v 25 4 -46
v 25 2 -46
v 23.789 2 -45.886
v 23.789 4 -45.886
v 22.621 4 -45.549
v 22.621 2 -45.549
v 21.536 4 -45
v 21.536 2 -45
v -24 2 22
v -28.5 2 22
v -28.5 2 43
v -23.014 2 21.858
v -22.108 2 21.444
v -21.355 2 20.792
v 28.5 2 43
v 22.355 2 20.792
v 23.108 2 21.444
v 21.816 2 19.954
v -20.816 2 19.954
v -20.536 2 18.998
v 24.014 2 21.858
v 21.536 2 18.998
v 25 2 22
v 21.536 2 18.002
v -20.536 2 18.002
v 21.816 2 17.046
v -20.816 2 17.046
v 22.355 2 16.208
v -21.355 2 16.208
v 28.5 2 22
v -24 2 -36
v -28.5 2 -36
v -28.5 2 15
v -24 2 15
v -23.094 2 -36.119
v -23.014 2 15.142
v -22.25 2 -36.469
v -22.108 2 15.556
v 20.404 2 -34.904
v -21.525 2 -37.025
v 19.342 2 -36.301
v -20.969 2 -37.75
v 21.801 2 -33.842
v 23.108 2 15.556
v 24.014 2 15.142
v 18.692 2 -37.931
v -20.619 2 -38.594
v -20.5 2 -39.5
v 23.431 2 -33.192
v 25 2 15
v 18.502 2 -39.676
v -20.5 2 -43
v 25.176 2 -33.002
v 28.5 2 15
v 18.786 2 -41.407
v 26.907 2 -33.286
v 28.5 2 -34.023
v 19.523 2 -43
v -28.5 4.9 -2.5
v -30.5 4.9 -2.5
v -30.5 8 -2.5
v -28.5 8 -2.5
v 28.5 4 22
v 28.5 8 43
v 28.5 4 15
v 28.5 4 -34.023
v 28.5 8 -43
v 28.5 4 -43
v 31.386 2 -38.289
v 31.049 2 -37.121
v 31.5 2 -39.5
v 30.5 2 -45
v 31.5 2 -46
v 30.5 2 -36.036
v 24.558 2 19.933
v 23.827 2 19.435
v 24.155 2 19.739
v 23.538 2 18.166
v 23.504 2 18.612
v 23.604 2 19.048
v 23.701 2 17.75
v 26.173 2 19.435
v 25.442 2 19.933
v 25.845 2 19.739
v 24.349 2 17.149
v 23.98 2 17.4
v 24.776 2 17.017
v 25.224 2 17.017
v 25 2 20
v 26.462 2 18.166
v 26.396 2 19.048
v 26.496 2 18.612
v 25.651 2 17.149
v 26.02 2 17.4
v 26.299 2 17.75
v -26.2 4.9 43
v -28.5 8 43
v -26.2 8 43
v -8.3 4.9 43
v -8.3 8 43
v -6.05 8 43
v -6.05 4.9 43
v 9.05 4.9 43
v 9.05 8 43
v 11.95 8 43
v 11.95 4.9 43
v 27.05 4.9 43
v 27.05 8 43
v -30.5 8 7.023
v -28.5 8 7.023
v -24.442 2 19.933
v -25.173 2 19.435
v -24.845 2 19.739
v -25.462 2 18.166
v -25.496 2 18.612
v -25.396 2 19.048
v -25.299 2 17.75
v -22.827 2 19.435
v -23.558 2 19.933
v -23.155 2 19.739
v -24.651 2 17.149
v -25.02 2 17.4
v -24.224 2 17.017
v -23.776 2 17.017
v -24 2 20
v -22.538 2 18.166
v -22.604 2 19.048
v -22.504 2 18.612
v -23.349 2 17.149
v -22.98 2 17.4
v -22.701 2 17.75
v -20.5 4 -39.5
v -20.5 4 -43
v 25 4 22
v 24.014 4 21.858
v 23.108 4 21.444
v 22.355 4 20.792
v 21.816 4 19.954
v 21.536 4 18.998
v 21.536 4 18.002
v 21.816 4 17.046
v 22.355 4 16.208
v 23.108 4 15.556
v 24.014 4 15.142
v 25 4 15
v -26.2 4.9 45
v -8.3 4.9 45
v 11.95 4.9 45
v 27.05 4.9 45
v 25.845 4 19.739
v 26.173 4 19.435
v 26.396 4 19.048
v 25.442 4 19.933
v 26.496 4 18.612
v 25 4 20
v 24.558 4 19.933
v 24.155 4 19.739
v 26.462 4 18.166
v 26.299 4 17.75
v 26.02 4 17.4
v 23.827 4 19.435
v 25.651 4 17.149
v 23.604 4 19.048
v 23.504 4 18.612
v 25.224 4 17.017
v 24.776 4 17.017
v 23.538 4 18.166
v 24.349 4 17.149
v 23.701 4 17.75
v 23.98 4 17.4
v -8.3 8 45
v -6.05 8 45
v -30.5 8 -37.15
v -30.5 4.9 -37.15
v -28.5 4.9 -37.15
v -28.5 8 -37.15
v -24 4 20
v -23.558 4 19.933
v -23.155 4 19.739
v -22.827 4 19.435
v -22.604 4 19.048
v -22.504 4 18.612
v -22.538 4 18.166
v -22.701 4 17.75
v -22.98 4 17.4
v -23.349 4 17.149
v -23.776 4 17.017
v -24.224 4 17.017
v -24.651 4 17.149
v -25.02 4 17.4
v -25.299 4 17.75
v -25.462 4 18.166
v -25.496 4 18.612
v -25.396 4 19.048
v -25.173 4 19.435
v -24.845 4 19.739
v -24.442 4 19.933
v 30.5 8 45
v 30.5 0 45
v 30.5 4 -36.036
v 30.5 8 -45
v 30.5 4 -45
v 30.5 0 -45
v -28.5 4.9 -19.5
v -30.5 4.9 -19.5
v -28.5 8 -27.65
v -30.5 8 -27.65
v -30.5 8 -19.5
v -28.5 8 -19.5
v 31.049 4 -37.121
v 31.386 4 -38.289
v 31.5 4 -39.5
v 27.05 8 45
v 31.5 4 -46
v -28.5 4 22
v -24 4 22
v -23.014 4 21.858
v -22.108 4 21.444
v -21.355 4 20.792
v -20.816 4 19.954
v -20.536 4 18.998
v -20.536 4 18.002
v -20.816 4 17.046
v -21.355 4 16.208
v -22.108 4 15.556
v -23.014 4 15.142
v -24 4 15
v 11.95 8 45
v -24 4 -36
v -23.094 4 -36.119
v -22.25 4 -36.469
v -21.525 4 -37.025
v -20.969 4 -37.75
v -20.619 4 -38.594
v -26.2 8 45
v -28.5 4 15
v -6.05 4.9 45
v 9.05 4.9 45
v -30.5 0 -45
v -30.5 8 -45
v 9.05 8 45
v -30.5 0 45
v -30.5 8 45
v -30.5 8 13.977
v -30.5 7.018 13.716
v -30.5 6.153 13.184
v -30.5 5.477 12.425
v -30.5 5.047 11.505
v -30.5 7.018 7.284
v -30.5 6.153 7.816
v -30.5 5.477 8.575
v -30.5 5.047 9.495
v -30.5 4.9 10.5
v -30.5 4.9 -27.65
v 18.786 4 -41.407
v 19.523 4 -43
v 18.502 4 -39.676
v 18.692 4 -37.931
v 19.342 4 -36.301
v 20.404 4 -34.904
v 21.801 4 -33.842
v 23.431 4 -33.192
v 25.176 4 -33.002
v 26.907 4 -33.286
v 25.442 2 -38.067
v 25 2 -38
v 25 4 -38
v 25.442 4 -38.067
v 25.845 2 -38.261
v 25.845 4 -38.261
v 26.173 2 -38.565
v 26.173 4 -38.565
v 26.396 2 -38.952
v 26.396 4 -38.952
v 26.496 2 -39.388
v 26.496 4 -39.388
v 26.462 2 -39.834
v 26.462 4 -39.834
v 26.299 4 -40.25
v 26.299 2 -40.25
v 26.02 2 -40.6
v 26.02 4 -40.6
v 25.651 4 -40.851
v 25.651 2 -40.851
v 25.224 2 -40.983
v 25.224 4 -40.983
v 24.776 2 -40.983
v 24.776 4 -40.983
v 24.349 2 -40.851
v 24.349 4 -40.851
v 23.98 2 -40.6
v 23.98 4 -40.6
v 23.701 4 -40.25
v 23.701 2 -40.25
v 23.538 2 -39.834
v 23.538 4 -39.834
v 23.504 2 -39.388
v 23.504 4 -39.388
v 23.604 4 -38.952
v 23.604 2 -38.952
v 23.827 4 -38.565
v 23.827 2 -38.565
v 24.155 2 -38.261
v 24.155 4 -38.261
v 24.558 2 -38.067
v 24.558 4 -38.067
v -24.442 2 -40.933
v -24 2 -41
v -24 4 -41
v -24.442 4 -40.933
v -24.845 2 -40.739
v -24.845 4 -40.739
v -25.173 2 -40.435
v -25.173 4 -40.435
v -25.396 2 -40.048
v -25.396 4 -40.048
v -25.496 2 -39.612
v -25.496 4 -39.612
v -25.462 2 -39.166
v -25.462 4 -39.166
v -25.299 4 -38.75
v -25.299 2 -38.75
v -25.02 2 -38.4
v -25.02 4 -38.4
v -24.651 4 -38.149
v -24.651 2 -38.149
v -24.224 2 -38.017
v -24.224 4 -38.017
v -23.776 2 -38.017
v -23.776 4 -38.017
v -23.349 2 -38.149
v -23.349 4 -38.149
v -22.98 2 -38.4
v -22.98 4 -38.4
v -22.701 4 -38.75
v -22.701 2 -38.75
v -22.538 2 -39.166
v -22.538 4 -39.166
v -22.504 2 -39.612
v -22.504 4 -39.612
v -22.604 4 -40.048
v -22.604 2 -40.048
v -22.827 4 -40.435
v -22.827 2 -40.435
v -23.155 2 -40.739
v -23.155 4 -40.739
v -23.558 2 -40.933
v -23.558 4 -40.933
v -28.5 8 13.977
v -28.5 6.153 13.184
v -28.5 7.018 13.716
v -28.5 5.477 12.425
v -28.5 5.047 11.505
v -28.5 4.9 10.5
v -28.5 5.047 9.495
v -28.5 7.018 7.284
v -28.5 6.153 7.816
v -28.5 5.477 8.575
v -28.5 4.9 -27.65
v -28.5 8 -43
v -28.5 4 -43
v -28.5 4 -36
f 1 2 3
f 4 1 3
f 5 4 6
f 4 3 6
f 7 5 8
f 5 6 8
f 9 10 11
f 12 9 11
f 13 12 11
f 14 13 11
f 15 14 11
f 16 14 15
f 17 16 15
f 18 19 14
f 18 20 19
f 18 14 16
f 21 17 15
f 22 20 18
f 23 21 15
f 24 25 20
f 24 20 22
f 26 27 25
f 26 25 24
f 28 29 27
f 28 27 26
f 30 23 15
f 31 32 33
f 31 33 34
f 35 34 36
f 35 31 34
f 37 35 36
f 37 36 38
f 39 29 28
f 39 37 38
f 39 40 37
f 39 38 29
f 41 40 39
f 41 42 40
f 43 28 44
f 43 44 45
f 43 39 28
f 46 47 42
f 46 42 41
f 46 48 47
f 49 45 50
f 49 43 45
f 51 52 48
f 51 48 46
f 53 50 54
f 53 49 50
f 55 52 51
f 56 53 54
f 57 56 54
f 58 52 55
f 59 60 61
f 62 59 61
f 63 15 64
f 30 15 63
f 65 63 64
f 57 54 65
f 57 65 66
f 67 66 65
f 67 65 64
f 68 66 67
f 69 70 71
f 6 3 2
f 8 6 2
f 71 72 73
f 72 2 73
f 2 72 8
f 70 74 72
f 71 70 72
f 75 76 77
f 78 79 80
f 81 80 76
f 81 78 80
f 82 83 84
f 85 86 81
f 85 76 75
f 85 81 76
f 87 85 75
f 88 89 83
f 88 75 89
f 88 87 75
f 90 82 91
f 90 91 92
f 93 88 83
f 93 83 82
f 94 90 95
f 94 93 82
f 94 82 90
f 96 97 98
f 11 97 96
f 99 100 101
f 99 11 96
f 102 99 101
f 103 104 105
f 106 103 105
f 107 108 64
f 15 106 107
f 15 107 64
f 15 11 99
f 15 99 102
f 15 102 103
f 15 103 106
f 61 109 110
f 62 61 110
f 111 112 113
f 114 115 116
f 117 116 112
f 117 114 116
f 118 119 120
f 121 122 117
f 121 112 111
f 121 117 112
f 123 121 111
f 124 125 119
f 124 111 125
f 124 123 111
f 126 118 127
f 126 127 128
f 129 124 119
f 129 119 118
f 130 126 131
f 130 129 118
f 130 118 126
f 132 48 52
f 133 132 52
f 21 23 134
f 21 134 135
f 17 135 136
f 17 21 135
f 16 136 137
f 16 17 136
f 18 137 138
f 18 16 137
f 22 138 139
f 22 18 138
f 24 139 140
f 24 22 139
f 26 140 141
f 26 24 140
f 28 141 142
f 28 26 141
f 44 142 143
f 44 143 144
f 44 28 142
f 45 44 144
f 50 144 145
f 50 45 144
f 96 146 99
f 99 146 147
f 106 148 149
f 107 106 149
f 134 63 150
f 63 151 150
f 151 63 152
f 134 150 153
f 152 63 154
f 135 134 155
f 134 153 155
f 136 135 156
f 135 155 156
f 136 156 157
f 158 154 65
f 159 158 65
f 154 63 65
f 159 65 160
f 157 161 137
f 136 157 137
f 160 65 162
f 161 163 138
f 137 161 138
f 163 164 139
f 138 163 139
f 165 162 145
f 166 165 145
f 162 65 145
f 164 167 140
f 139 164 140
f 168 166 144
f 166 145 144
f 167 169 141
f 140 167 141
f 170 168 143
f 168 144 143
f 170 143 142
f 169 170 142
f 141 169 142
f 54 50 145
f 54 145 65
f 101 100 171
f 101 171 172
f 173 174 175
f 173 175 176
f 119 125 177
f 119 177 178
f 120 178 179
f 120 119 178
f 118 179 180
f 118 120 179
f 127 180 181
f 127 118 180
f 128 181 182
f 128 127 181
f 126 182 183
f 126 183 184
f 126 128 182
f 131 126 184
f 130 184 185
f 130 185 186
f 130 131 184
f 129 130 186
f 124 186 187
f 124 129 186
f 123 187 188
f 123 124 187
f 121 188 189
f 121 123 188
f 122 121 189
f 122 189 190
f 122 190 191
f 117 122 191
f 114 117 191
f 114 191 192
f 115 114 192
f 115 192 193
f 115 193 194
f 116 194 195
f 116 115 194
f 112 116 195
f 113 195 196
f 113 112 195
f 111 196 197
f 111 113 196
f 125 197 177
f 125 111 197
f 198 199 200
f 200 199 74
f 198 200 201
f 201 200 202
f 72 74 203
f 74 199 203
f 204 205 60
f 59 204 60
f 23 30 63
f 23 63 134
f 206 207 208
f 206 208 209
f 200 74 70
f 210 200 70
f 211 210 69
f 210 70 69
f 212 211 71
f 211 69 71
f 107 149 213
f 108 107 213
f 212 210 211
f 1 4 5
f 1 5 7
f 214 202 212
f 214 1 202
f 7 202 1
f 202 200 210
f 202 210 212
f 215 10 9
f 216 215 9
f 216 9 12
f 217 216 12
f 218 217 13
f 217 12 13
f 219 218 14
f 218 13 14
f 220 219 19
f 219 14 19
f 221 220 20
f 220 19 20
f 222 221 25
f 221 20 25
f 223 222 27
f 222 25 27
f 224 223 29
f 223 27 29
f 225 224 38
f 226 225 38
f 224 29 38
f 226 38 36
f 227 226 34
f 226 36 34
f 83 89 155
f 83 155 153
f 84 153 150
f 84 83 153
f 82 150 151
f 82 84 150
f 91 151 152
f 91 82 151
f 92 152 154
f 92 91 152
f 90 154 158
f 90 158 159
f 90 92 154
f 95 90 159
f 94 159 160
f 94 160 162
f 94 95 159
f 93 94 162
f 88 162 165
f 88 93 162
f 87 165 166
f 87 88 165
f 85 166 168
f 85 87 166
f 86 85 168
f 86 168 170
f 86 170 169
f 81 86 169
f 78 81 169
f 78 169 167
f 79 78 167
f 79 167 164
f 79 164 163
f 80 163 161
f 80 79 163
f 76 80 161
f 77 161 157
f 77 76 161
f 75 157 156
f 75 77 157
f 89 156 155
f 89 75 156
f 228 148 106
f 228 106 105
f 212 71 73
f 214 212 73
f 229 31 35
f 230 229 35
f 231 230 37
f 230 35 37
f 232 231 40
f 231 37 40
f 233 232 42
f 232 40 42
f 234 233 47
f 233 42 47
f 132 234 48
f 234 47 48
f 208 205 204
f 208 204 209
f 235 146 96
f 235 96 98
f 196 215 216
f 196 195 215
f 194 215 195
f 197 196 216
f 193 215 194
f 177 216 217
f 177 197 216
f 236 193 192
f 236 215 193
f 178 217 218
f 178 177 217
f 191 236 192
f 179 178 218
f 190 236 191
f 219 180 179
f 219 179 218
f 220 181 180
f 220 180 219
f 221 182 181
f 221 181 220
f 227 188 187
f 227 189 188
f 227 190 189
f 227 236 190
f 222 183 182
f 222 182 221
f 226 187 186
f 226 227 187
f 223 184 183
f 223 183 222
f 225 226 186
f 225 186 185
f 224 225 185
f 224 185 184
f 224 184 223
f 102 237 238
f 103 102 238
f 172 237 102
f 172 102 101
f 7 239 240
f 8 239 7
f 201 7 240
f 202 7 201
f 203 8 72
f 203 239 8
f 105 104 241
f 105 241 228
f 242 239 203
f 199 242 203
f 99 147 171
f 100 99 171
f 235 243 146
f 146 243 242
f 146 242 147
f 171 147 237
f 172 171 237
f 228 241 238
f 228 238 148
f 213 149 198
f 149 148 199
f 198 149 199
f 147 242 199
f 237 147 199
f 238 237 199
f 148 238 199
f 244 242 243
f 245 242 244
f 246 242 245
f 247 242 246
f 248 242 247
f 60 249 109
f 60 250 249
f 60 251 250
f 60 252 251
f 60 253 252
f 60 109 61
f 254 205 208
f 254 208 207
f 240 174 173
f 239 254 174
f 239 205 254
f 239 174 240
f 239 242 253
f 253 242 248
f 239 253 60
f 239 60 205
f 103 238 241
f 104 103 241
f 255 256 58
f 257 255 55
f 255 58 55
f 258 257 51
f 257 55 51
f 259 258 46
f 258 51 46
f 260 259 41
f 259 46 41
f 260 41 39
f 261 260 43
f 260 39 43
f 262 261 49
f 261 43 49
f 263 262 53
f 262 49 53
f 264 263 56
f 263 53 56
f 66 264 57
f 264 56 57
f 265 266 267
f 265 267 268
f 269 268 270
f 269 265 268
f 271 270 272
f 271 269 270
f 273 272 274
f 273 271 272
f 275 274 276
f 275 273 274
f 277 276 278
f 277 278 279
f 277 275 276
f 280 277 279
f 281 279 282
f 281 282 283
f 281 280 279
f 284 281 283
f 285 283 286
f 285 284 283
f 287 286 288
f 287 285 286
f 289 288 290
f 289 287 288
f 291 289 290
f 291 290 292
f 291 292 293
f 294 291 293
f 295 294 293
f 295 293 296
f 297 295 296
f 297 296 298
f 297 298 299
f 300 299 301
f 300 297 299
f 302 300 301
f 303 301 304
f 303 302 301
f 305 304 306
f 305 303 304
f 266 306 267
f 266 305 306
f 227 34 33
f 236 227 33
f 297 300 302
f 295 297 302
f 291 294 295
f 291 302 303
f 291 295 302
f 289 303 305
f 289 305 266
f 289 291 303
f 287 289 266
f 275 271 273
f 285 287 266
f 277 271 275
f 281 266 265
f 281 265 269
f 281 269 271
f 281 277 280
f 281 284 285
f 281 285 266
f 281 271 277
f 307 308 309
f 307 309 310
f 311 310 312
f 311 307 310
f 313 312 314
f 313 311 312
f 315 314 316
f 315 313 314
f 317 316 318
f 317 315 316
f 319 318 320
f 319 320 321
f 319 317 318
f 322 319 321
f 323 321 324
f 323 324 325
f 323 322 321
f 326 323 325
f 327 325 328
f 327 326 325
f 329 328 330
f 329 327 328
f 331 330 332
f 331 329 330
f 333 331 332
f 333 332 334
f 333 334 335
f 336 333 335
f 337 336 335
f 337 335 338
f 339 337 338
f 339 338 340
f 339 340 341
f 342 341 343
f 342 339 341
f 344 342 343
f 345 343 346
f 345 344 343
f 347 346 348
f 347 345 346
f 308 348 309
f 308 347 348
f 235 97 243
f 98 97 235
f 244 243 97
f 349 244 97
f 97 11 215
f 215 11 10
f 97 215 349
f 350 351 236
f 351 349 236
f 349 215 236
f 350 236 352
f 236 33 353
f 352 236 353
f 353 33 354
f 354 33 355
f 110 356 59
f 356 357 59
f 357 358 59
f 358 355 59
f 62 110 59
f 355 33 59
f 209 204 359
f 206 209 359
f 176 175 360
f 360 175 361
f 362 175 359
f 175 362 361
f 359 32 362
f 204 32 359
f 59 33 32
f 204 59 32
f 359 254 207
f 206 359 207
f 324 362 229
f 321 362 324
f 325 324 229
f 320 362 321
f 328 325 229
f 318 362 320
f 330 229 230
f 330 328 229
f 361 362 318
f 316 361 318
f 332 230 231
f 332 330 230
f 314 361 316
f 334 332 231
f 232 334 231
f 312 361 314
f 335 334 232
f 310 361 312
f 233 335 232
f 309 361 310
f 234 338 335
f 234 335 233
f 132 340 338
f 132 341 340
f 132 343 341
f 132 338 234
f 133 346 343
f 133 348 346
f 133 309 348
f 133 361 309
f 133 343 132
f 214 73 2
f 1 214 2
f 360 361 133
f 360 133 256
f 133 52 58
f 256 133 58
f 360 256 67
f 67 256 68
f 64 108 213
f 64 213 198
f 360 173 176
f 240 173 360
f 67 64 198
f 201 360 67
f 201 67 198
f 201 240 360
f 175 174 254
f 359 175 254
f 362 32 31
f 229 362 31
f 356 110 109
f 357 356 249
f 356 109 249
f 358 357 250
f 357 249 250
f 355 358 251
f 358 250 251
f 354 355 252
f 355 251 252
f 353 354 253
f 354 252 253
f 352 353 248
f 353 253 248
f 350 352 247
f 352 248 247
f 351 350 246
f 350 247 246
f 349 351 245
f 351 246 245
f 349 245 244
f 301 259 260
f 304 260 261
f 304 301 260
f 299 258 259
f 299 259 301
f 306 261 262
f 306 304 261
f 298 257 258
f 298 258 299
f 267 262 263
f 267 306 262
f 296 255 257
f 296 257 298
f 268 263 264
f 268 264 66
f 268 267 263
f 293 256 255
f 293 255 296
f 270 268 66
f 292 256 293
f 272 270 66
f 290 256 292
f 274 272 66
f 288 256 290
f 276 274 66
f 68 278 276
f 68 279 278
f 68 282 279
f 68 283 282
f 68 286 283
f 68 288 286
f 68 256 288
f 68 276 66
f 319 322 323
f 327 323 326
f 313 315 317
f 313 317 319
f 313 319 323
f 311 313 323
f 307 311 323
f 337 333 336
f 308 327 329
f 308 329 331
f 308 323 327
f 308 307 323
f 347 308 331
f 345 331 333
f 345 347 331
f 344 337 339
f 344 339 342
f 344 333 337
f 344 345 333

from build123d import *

# Parameters (mm, degrees)
SKETCH1_W            = 61
SKETCH1_H            = 90
BOSS_EXTRUDE1_DEPTH  = 8
SKETCH4_W            = 57
SKETCH4_H            = 86
CUT_EXTRUDE1_DEPTH   = 6
SKETCH5_R            = 1.5
BOSS_EXTRUDE12_DEPTH = 2
CUT_EXTRUDE2_REACH   = 79.614
SKETCH6_R            = 3.5
SKETCH6_W            = 17
SKETCH6_H            = 6.5
SKETCH6_W_2          = 9.5
SKETCH6_H_2          = 4
CUT_EXTRUDE3_REACH   = 98.629
SKETCH8_W            = 17.9
SKETCH8_H            = 15.5
SKETCH8_W_2          = 15.1
SKETCH8_H_2          = 16


with BuildPart() as part:
    # Sketch1 → Boss-Extrude1 (new body)
    with BuildSketch(Plane(origin=(0, 0, 0), x_dir=(1, 0, 0), z_dir=(0, 1, 0))):
        Rectangle(SKETCH1_W, SKETCH1_H)
    extrude(amount=BOSS_EXTRUDE1_DEPTH)

    # Sketch4 → Cut-Extrude1 (cut)
    with BuildSketch(Plane(origin=(0, 2, 0), x_dir=(1, 0, 0), z_dir=(0, 1, 0))):
        Rectangle(SKETCH4_W, SKETCH4_H)
    extrude(amount=CUT_EXTRUDE1_DEPTH, mode=Mode.SUBTRACT)

    # Sketch5 → Boss-Extrude12 (add)
    # profile 1 of 4: a face of its own
    with BuildSketch(Plane(origin=(0, 2, 0), x_dir=(1, 0, 0), z_dir=(0, 1, 0))):
        with BuildLine():
            Line((25, -15), (28.5, -15))
            Line((28.5, -15), (28.5, -22))
            Line((28.5, -22), (25, -22))
            ThreePointArc((25, -22), (21.5, -18.5), (25, -15))
        make_face()
        with Locations(Location((25, -18.5, 0), (0, 0, 270))):
            Circle(SKETCH5_R, mode=Mode.SUBTRACT)
    # profile 2 of 4: a face of its own
    with BuildSketch(Plane(origin=(0, 2, 0), x_dir=(1, 0, 0), z_dir=(0, 1, 0))):
        with BuildLine():
            Line((31.5, 39.5), (31.5, 46))
            Line((31.5, 46), (25, 46))
            ThreePointArc((25, 46), (20.403805922, 34.903805922), (31.5, 39.5))
        make_face()
        with Locations(Location((25, 39.5, 0), (0, 0, 270))):
            Circle(SKETCH5_R, mode=Mode.SUBTRACT)
    # profile 3 of 4: a face of its own
    with BuildSketch(Plane(origin=(0, 2, 0), x_dir=(1, 0, 0), z_dir=(0, 1, 0))):
        with BuildLine():
            Line((-20.5, 39.5), (-20.5, 43))
            Line((-20.5, 43), (-28.5, 43))
            Line((-28.5, 43), (-28.5, 36))
            Line((-28.5, 36), (-24, 36))
            ThreePointArc((-24, 36), (-21.525126266, 37.025126266), (-20.5, 39.5))
        make_face()
        with Locations(Location((-24, 39.5, 0), (0, 0, 90))):
            Circle(SKETCH5_R, mode=Mode.SUBTRACT)
    # profile 4 of 4: a face of its own
    with BuildSketch(Plane(origin=(0, 2, 0), x_dir=(1, 0, 0), z_dir=(0, 1, 0))):
        with BuildLine():
            Line((-24, -15), (-28.506473373, -15))
            Line((-28.506473373, -15), (-28.5, -22))
            Line((-28.5, -22), (-24, -22))
            ThreePointArc((-24, -22), (-20.5, -18.5), (-24, -15))
        make_face()
        with Locations(Location((-24, -18.5, 0), (0, 0, 270))):
            Circle(SKETCH5_R, mode=Mode.SUBTRACT)
    extrude(amount=BOSS_EXTRUDE12_DEPTH)

    # Sketch6 → Cut-Extrude2 (cut, up to next)
    with BuildSketch(Plane.ZY.offset(30.5), mode=Mode.PRIVATE) as cut_extrude2_sk1:
        with Locations((10.5, 8.4)):
            Circle(SKETCH6_R)
    cut_extrude2_tool1 = extrude(cut_extrude2_sk1.sketch, amount=-CUT_EXTRUDE2_REACH, mode=Mode.PRIVATE) & part.part
    # Sketch6 → Cut-Extrude2 (cut, up to next)
    with BuildSketch(Plane.ZY.offset(30.5), mode=Mode.PRIVATE) as cut_extrude2_sk2:
        with Locations((-11, 8.15)):
            Rectangle(SKETCH6_W, SKETCH6_H)
    cut_extrude2_tool2 = extrude(cut_extrude2_sk2.sketch, amount=-CUT_EXTRUDE2_REACH, mode=Mode.PRIVATE) & part.part
    # Sketch6 → Cut-Extrude2 (cut, up to next)
    with BuildSketch(Plane.ZY.offset(30.5), mode=Mode.PRIVATE) as cut_extrude2_sk3:
        with Locations((-32.4, 6.9)):
            Rectangle(SKETCH6_W_2, SKETCH6_H_2)
    cut_extrude2_tool3 = extrude(cut_extrude2_sk3.sketch, amount=-CUT_EXTRUDE2_REACH, mode=Mode.PRIVATE) & part.part
    add(cut_extrude2_tool1.solids().sort_by_distance((-30.5, 8.4, 10.5))[0], mode=Mode.SUBTRACT)
    add(cut_extrude2_tool2.solids().sort_by_distance((-30.5, 8.15, -11))[0], mode=Mode.SUBTRACT)
    add(cut_extrude2_tool3.solids().sort_by_distance((-30.5, 6.9, -32.4))[0], mode=Mode.SUBTRACT)

    # Sketch8 → Cut-Extrude3 (cut, up to next)
    with BuildSketch(Plane.XY.offset(45), mode=Mode.PRIVATE) as cut_extrude3_sk1:
        with Locations((-17.25, 12.65)):
            Rectangle(SKETCH8_W, SKETCH8_H)
    cut_extrude3_tool1 = extrude(cut_extrude3_sk1.sketch, amount=-CUT_EXTRUDE3_REACH, mode=Mode.PRIVATE) & part.part
    # Sketch8 → Cut-Extrude3 (cut, up to next)
    with BuildSketch(Plane.XY.offset(45), mode=Mode.PRIVATE) as cut_extrude3_sk2:
        with Locations((1.5, 12.9)):
            Rectangle(SKETCH8_W_2, SKETCH8_H_2)
    cut_extrude3_tool2 = extrude(cut_extrude3_sk2.sketch, amount=-CUT_EXTRUDE3_REACH, mode=Mode.PRIVATE) & part.part
    # Sketch8 → Cut-Extrude3 (cut, up to next)
    with BuildSketch(Plane.XY.offset(45), mode=Mode.PRIVATE) as cut_extrude3_sk3:
        with Locations((19.5, 12.9)):
            Rectangle(SKETCH8_W_2, SKETCH8_H_2)
    cut_extrude3_tool3 = extrude(cut_extrude3_sk3.sketch, amount=-CUT_EXTRUDE3_REACH, mode=Mode.PRIVATE) & part.part
    add(cut_extrude3_tool1.solids().sort_by_distance((-17.25, 12.65, 45))[0], mode=Mode.SUBTRACT)
    add(cut_extrude3_tool2.solids().sort_by_distance((1.5, 12.9, 45))[0], mode=Mode.SUBTRACT)
    add(cut_extrude3_tool3.solids().sort_by_distance((19.5, 12.9, 45))[0], mode=Mode.SUBTRACT)


solid = part.part
